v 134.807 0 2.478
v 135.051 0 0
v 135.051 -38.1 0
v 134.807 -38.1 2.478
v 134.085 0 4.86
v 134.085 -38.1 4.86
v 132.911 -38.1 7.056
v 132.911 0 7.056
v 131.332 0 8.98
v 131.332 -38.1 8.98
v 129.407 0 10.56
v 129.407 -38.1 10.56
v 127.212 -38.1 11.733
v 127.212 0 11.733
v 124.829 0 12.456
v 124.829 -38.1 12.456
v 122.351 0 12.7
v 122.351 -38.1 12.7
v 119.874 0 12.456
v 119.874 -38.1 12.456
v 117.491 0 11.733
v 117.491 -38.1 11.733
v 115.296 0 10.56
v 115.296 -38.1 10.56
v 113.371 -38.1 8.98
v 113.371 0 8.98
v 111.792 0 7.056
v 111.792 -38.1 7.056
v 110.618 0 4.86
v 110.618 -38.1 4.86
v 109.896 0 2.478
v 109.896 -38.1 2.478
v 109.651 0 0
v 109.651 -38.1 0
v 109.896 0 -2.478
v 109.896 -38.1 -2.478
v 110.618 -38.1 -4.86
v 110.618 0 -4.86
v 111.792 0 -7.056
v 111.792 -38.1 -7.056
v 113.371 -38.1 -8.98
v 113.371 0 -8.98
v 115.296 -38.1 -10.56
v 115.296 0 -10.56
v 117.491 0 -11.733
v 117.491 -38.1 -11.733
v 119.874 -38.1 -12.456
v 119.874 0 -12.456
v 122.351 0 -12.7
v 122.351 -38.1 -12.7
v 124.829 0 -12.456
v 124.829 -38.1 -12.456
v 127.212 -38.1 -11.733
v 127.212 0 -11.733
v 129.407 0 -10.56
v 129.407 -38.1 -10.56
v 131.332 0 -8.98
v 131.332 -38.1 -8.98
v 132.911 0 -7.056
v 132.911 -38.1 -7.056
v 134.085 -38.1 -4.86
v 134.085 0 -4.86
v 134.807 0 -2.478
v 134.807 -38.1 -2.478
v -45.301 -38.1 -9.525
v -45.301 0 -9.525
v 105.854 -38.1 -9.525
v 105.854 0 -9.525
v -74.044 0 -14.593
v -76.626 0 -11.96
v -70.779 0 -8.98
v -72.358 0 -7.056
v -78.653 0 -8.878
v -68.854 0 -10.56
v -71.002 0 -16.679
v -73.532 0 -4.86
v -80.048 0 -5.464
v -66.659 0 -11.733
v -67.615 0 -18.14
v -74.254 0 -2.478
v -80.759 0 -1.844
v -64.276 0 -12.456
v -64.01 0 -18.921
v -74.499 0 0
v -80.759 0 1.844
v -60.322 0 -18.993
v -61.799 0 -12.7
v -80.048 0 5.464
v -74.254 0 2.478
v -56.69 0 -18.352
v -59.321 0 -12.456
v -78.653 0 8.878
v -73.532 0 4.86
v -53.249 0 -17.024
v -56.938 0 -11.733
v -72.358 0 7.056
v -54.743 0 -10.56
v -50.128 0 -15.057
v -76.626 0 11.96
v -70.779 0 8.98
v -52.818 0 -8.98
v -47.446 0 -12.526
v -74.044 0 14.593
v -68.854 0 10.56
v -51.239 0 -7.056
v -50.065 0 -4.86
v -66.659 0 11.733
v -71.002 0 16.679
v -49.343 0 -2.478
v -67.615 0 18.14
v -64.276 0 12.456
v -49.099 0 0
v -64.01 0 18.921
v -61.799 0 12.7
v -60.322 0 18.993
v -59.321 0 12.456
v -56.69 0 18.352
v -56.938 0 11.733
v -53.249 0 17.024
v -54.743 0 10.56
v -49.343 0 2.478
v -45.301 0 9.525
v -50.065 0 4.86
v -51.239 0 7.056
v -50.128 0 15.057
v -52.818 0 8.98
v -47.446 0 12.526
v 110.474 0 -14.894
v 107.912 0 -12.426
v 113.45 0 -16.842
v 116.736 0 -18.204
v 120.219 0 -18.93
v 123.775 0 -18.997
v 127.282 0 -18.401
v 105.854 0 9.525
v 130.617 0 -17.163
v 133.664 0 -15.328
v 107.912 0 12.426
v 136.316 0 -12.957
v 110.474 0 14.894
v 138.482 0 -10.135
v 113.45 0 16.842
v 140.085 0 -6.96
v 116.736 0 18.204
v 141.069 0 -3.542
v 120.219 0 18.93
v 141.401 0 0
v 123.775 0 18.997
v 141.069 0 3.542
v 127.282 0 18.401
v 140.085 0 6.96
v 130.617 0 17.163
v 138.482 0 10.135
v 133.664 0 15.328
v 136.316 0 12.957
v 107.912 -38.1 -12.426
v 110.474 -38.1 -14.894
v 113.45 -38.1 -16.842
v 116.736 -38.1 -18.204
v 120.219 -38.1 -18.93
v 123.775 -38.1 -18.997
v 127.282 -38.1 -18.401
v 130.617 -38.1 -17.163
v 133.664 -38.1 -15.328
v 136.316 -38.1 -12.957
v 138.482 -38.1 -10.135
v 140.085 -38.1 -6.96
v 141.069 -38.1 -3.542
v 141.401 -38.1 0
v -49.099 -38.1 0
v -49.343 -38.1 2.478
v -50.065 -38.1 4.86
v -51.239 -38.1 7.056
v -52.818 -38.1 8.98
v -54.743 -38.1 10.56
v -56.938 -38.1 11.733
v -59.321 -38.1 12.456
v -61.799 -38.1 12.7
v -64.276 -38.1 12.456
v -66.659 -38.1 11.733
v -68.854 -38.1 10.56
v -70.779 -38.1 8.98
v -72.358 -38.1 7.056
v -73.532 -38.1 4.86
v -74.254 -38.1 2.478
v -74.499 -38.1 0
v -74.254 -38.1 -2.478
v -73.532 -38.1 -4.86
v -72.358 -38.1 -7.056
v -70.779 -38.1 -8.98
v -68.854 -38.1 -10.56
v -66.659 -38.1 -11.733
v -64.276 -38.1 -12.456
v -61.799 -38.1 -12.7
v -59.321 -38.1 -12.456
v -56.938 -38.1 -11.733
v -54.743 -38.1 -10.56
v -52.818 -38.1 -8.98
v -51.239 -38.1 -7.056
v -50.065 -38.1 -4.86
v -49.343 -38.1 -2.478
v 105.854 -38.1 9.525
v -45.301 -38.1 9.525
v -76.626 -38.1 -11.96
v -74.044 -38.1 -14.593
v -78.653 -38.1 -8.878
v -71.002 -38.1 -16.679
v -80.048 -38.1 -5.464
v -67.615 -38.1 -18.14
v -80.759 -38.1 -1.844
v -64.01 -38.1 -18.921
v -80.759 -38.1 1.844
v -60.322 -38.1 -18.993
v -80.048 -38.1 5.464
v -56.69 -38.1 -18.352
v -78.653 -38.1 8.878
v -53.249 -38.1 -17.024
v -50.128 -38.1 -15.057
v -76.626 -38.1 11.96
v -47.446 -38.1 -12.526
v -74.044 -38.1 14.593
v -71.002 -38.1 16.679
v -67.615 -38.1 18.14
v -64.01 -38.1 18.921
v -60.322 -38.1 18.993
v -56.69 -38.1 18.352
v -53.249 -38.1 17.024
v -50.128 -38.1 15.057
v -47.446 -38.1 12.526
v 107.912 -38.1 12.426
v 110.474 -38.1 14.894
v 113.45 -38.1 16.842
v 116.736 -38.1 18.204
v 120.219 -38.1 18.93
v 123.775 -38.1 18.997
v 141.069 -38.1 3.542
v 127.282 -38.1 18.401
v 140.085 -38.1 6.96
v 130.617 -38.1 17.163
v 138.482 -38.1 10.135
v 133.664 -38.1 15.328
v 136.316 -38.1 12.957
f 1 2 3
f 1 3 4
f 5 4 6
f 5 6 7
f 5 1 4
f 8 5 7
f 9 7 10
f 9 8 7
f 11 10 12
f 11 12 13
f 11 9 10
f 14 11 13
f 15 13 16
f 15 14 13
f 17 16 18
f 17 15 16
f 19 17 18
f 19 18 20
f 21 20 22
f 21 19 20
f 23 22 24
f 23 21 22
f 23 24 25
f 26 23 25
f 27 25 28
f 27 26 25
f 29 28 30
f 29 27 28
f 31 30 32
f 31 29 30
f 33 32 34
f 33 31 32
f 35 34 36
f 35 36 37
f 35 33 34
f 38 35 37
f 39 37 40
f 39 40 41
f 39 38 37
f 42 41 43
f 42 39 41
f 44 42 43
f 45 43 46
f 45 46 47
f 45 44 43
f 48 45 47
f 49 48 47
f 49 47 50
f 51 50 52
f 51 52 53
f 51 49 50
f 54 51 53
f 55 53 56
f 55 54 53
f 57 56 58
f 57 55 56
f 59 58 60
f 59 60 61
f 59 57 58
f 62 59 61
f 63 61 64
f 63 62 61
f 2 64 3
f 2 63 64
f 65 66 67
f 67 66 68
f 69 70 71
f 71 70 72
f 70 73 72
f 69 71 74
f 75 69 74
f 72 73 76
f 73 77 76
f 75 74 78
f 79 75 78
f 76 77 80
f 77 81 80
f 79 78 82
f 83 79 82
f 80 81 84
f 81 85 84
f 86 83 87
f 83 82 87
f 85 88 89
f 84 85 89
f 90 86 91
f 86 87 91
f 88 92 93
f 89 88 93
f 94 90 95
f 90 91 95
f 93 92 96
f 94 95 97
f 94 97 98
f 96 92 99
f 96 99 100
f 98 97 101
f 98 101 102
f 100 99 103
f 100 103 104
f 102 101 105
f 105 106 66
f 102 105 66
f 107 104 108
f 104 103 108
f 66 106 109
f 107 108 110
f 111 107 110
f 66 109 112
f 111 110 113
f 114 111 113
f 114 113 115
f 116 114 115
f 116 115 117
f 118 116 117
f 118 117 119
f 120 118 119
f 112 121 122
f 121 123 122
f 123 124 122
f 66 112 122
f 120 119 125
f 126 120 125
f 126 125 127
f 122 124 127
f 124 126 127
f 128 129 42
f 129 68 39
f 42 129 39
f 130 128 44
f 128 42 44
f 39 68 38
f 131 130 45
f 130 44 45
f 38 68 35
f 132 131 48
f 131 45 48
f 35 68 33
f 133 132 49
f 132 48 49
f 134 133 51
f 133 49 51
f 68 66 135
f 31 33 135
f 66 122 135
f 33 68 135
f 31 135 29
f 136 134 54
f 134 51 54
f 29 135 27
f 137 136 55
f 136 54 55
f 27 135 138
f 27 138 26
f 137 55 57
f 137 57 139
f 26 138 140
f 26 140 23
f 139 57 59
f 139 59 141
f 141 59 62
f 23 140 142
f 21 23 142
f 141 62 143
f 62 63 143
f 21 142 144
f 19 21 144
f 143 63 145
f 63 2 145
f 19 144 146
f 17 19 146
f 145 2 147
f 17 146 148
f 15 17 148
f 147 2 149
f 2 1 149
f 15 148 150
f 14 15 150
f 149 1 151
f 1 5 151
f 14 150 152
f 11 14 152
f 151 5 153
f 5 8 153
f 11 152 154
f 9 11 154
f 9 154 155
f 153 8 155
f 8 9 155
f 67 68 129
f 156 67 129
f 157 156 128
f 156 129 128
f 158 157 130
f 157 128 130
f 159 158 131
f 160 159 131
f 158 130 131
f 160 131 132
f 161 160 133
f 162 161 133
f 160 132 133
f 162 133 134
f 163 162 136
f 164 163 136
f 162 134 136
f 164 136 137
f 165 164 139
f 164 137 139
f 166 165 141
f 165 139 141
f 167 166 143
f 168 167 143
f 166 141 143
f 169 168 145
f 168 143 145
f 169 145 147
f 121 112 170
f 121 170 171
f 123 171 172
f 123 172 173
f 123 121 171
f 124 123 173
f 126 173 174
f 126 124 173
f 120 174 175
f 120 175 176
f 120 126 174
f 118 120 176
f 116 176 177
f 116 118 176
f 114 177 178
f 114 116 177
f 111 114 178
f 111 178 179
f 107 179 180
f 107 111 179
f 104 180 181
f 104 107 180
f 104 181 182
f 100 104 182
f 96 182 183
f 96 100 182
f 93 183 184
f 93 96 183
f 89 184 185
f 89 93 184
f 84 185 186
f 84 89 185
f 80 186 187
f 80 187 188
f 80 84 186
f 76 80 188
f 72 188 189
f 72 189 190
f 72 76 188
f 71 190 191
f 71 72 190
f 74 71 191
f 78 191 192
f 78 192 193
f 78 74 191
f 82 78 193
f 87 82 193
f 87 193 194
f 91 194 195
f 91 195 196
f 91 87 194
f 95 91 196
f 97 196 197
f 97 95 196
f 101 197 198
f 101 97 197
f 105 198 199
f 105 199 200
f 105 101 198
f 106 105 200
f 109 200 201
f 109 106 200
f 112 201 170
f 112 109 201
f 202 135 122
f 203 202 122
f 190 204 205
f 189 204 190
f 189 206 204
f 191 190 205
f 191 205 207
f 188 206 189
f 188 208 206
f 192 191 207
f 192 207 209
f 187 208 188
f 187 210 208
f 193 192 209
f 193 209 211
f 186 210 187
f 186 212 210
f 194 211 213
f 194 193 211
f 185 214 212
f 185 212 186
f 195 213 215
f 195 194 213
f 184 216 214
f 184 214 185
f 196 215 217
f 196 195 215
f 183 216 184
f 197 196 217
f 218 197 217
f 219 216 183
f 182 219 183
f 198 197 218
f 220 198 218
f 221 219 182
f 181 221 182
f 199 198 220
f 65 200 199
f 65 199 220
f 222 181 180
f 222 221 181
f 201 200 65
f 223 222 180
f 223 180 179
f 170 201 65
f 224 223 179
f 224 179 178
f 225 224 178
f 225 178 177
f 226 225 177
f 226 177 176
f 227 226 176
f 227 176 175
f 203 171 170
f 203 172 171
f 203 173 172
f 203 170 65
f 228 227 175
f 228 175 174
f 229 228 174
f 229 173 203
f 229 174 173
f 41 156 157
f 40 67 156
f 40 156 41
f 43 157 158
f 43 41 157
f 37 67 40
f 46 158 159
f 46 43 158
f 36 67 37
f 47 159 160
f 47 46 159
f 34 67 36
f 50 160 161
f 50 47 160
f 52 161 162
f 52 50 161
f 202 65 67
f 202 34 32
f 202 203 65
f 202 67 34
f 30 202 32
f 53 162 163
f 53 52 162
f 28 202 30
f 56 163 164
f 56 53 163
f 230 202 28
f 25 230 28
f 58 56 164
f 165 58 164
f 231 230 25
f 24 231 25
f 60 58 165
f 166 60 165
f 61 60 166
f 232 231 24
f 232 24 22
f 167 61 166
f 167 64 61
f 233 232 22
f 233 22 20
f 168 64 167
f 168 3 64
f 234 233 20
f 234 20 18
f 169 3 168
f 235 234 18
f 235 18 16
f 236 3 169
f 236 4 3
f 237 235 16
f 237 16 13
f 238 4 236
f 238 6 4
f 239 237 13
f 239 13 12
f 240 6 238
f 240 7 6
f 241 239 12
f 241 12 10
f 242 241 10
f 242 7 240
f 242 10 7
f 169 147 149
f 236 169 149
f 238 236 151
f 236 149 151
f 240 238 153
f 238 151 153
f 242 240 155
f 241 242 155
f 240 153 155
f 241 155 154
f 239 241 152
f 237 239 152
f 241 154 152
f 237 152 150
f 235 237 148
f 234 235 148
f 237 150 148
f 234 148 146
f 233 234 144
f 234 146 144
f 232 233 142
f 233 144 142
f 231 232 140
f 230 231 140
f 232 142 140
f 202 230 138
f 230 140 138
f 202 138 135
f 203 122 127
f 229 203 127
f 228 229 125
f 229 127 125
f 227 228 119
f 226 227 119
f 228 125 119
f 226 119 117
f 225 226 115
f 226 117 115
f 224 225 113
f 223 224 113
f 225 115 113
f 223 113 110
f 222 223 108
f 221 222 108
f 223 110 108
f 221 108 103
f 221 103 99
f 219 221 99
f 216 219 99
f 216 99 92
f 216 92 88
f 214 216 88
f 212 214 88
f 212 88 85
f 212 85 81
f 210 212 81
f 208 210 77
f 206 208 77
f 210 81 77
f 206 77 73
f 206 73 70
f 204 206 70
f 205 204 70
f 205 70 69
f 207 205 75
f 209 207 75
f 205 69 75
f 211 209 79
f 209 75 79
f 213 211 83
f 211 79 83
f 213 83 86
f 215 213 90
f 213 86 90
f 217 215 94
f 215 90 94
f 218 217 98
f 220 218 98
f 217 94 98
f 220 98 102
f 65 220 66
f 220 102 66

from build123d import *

# Parameters (mm, degrees)
F0_R     = 12.7
F0_W     = 1.2455678842
F0_H     = 19.05
F1_DEPTH = 38.1


with BuildPart() as f1:
    # F0 (on Front) → F1 (new body)
    with BuildSketch(Plane.XZ):
        with BuildLine():
            ThreePointArc((-45.300738686, -9.525), (-43.3976356373, -4.9305028092), (-42.7485226281, 0))
            ThreePointArc((-42.7485226281, 0), (-43.3976356373, 4.9305028092), (-45.300738686, 9.525))
            Line((-45.300738686, 9.525), (-45.300738686, -9.525))
        make_face()
        with BuildLine():
            ThreePointArc((-45.300738686, 9.525), (-43.3976356373, 4.9305028092), (-42.7485226281, 0))
            ThreePointArc((-42.7485226281, 0), (-43.3976356373, -4.9305028092), (-45.300738686, -9.525))
            Line((-45.300738686, -9.525), (105.8536934298, -9.525))
            ThreePointArc((105.8536934298, -9.525), (103.3014773719, 0), (105.8536934298, 9.525))
            Line((105.8536934298, 9.525), (-45.300738686, 9.525))
        make_face()
        with BuildLine():
            Line((-46.5463065702, 9.525), (-45.300738686, 9.525))
            ThreePointArc((-45.300738686, 9.525), (-80.8485226281, 0), (-45.300738686, -9.525))
            Line((-45.300738686, -9.525), (-46.5463065702, -9.525))
            Line((-46.5463065702, -9.525), (-46.5463065702, 9.525))
        make_face()
        with Locations((-61.7985226281, 0)):
            Circle(F0_R, mode=Mode.SUBTRACT)
        with Locations((-45.9235226281, 0)):
            Rectangle(F0_W, F0_H)
        with BuildLine():
            ThreePointArc((141.4014773719, 0), (127.2819801811, 18.4008869908), (105.8536934298, 9.525))
            Line((105.8536934298, 9.525), (107.099261314, 9.525))
            Line((107.099261314, 9.525), (107.099261314, -9.525))
            Line((107.099261314, -9.525), (105.8536934298, -9.525))
            ThreePointArc((105.8536934298, -9.525), (127.2819801811, -18.4008869908), (141.4014773719, 0))
        make_face()
        with Locations((122.3514773719, 0)):
            Circle(F0_R, mode=Mode.SUBTRACT)
        with BuildLine():
            Line((105.8536934298, -9.525), (105.8536934298, 9.525))
            ThreePointArc((105.8536934298, 9.525), (103.3014773719, 0), (105.8536934298, -9.525))
        make_face()
        with Locations((106.4764773719, 0)):
            Rectangle(F0_W, F0_H)
    extrude(amount=F1_DEPTH)


solid = f1.part
